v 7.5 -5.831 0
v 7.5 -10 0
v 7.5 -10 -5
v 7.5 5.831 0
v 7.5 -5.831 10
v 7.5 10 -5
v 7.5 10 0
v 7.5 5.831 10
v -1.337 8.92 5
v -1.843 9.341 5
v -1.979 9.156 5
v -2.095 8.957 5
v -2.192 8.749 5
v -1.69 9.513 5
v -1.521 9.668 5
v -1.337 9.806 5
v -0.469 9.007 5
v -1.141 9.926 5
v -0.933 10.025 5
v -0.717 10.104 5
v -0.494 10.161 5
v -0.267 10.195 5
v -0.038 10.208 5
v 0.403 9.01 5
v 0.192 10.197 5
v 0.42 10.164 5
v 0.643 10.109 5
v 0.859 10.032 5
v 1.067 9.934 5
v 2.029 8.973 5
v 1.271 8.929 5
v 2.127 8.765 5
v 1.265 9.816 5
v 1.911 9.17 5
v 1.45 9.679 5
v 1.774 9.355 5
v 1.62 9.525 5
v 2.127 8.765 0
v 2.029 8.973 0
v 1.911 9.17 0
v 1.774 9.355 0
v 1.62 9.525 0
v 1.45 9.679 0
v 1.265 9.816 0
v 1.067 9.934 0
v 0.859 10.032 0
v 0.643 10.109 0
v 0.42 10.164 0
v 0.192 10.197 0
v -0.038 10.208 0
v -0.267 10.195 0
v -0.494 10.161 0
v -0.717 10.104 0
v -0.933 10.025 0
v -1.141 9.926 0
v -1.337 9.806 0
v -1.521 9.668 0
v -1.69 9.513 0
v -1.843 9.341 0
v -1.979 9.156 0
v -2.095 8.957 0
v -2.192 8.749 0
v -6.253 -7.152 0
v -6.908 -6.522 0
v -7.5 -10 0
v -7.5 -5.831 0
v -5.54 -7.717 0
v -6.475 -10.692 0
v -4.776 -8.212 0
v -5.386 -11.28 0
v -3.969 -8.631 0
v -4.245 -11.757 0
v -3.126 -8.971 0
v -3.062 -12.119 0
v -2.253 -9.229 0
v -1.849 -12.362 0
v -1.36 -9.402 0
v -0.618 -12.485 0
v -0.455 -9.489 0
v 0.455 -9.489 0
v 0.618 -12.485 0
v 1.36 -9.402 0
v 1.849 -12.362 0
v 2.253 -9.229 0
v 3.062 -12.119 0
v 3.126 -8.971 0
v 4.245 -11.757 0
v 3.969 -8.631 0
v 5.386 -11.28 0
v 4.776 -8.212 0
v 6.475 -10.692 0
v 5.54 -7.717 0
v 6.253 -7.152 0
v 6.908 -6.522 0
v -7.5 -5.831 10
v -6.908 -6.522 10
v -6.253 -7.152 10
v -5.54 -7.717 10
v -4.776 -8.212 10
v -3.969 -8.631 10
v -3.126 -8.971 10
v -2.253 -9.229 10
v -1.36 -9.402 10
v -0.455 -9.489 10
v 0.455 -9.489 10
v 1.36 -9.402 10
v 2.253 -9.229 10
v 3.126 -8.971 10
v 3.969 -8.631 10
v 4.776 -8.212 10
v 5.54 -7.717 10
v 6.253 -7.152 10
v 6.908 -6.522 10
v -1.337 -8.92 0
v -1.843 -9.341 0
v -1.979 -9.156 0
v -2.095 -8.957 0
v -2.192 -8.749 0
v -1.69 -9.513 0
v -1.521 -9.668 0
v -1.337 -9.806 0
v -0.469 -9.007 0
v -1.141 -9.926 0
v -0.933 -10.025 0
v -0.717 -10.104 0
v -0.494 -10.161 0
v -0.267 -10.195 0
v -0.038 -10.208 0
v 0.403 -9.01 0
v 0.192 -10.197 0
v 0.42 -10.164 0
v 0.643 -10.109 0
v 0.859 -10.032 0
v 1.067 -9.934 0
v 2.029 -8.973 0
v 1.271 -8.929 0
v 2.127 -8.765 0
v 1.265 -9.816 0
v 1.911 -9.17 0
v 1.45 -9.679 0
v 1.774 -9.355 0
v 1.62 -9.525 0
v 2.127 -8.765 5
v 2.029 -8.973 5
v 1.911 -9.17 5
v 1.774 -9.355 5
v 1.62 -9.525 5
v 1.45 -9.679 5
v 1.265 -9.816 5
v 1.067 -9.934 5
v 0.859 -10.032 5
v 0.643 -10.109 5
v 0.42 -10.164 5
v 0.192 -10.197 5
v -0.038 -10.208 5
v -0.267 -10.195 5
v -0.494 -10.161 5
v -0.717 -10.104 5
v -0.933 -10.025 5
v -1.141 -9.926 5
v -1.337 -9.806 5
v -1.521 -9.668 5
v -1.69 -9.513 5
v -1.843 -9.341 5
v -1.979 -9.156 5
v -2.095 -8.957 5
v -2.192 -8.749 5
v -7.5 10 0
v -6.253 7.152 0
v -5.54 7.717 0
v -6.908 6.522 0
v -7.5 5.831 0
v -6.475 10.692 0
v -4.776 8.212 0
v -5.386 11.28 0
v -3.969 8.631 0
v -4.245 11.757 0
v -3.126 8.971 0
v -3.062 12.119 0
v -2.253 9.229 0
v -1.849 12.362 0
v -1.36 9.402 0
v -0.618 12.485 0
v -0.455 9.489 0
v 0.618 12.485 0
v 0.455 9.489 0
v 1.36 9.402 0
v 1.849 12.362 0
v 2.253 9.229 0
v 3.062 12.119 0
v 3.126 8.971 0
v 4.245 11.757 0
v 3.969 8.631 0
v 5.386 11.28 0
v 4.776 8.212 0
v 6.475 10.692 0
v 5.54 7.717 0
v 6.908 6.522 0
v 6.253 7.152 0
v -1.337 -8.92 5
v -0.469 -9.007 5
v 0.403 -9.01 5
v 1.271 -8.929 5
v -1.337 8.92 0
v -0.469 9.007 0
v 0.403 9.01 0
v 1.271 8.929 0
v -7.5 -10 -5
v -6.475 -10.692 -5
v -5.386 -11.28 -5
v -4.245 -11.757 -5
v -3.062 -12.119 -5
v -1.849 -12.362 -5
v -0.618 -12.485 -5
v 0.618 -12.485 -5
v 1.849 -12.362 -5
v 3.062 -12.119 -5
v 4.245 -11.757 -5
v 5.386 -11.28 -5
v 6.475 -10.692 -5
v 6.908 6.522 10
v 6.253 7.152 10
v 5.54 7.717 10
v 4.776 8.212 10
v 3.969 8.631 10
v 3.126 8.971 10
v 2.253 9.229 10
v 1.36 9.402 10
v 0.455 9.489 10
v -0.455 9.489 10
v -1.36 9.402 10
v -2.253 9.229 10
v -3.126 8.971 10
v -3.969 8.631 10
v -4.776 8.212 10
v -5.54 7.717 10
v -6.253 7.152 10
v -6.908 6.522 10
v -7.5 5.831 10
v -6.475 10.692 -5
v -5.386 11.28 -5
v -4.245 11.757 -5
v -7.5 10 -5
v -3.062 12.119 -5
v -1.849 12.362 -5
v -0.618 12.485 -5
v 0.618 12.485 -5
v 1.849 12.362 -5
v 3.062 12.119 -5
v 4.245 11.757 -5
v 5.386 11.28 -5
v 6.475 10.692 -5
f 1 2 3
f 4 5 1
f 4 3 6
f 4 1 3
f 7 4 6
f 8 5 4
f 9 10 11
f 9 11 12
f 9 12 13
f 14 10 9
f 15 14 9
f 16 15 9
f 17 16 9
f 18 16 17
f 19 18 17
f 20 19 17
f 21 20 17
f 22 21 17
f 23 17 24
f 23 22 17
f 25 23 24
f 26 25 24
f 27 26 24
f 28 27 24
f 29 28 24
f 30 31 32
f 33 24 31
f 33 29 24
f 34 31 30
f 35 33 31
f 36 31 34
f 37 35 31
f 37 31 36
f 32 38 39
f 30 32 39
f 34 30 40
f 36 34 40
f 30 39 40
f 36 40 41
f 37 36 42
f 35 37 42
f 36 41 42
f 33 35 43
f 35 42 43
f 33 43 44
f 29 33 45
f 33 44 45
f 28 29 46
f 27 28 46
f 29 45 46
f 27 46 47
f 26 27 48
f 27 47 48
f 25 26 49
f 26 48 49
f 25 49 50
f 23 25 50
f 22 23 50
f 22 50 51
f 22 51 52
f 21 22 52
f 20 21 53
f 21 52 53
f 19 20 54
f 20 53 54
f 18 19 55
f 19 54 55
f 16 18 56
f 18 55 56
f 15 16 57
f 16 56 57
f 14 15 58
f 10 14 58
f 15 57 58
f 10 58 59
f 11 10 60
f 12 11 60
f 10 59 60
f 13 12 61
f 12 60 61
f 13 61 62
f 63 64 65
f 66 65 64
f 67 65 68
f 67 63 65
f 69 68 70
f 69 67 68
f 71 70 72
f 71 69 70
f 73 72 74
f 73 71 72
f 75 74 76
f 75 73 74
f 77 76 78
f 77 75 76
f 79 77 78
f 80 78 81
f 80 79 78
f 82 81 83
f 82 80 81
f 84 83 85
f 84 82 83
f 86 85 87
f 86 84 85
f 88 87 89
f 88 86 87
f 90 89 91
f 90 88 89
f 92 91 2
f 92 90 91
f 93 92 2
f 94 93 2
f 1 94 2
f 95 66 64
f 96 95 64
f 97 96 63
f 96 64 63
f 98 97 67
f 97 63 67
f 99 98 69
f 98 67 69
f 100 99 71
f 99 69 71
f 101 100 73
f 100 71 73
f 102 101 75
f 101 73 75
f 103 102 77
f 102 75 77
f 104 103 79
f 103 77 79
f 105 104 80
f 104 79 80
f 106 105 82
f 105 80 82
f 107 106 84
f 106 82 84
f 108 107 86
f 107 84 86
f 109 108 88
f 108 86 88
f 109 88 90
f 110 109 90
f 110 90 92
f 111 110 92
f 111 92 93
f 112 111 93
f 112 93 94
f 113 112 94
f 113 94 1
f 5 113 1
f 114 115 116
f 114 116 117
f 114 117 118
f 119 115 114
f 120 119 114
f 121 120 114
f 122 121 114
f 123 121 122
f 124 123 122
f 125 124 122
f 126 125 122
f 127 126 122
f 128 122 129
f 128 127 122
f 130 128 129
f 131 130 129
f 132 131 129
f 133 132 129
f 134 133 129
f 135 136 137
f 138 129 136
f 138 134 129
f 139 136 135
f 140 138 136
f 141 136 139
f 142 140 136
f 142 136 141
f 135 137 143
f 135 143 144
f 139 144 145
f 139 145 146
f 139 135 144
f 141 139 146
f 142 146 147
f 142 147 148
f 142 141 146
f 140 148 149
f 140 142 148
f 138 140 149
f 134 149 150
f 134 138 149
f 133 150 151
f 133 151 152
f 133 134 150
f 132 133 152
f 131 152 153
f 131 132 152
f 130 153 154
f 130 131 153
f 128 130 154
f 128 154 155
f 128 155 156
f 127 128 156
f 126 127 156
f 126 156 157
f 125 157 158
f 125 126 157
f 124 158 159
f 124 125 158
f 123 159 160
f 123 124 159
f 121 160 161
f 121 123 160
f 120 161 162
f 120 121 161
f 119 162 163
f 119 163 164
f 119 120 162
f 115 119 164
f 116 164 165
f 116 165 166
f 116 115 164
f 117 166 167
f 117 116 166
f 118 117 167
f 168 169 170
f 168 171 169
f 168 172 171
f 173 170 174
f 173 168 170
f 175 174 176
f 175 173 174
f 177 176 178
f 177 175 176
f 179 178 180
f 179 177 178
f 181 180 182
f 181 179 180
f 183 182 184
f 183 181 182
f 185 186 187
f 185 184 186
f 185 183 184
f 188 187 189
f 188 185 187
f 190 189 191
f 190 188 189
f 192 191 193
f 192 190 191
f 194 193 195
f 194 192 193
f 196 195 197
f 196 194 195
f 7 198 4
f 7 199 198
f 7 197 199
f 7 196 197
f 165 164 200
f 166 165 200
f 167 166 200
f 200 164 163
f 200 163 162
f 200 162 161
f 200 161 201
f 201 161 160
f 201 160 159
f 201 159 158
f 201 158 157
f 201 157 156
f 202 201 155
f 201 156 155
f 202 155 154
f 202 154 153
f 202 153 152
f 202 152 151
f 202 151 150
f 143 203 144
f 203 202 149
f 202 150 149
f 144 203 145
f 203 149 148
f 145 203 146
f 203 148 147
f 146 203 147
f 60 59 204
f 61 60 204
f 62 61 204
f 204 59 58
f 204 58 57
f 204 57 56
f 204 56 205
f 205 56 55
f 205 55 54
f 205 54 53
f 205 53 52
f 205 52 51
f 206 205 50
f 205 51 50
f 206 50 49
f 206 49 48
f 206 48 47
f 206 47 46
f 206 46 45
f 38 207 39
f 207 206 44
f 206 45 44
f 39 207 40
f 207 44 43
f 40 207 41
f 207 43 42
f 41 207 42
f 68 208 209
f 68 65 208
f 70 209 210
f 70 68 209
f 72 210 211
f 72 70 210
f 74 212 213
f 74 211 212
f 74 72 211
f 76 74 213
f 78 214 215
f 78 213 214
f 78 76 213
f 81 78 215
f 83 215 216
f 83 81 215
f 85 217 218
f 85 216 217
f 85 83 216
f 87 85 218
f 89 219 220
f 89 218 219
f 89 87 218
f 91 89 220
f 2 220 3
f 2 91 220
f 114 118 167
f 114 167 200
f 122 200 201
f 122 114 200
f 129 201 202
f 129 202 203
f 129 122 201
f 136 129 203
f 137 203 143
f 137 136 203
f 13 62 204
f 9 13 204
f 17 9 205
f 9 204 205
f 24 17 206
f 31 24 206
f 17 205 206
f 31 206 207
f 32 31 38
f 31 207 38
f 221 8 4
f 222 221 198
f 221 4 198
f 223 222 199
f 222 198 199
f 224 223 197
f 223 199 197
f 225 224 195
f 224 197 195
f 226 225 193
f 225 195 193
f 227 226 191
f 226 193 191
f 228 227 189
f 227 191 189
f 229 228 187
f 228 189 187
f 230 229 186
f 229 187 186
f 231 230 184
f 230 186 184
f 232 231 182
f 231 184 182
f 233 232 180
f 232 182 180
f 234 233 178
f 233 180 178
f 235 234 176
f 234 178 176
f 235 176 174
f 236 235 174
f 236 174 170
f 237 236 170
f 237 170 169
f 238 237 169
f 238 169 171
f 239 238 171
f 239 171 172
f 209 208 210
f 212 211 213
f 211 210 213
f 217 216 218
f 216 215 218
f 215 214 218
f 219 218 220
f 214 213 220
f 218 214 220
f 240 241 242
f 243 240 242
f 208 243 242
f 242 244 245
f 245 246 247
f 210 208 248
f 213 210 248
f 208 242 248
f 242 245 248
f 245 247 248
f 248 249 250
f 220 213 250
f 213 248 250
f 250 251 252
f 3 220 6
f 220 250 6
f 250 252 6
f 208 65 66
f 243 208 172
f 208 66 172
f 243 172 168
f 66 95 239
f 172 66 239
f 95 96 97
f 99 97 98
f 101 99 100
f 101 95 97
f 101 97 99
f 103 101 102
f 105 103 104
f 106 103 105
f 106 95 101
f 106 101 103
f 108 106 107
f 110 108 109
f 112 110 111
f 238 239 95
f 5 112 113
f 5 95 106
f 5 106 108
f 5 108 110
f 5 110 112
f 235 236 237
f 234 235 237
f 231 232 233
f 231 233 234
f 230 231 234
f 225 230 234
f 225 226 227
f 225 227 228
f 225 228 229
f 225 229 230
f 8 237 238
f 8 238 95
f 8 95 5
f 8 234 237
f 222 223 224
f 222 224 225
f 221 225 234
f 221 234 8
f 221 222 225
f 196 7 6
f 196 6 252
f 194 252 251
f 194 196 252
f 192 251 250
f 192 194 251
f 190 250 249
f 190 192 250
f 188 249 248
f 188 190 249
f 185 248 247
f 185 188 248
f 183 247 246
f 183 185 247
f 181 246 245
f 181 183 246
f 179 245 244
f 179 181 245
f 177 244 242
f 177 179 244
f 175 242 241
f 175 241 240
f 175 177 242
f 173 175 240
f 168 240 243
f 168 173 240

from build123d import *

# Parameters (mm, degrees)
F0_R      = 12.5
F1_DEPTH  = 5
F2_R      = 9.5
F3_DEPTH  = 10
F5_DEPTH  = 5
F7_W      = 30
F7_H      = 30
F7_W_2    = 15
F7_H_2    = 27
F8_DEPTH  = 10
F11_W     = 23.265004158
F11_H     = 35.2036263794
F12_DEPTH = 35


# Not quite as in the source:
# - a feature names something its author has since deleted; it is built from what else it names


with BuildPart() as f1:
    # F0 (on Top) → F1 (new body)
    with BuildSketch(Plane.XY):
        Circle(F0_R)
    extrude(amount=-F1_DEPTH)

    # F2 (on Top) → F3 (join)
    with BuildSketch(Plane.XY):
        Circle(F2_R)
    extrude(amount=F3_DEPTH)


with BuildPart() as f5:
    # F4 (on Top) → F5 (new body)
    with BuildSketch(Plane.XY):
        with BuildLine():
            ThreePointArc((-2.19192449, 8.7487287819), (-0.0332522533, 9.0190732649), (2.1273547272, 8.7646534521))
            ThreePointArc((2.1273547272, 8.7646534521), (-0.0376344683, 10.2076699565), (-2.19192449, 8.7487287819))
        make_face()
    extrude(amount=F5_DEPTH)


with BuildPart() as f6_1:
    # F6: instance of F5
    add(f5.part.mirror(Plane.XZ))


with BuildPart() as f8:
    # F7 (on Top) → F8 (new body, symmetric)
    with BuildSketch(Plane.XY):
        Rectangle(F7_W, F7_H)
        Rectangle(F7_W_2, F7_H_2, mode=Mode.SUBTRACT)
    extrude(amount=F8_DEPTH, both=True)


with BuildPart() as f1_1:
    add(f1.part)

    # F9: cut F8
    add(f8.part, mode=Mode.SUBTRACT)


with BuildPart() as f12:
    # F11 (on face) → F12 (new body)
    with BuildSketch(Plane(origin=(0, 0, -5), x_dir=(1, 0, 0), z_dir=(0, 0, -1))):
        with Locations((0.5739731714, -1.2244740501)):
            Rectangle(F11_W, F11_H)
        with BuildLine():
            Line((-7, 10.3561575886), (-7, 13.5))
            Line((-7, 13.5), (7, 13.5))
            Line((7, 13.5), (7, 10.3561575886))
            ThreePointArc((7, 10.3561575886), (7.2521867086, 10.1811486554), (7.5, 10))
            Line((7.5, 10), (7.5, -10))
            ThreePointArc((7.5, -10), (7.2521867086, -10.1811486554), (7, -10.3561575886))
            Line((7, -10.3561575886), (7, -13.5))
            Line((7, -13.5), (-7, -13.5))
            Line((-7, -13.5), (-7, -10.3561575886))
            ThreePointArc((-7, -10.3561575886), (-7.2521867086, -10.1811486554), (-7.5, -10))
            Line((-7.5, -10), (-7.5, 10))
            ThreePointArc((-7.5, 10), (-7.2521867086, 10.1811486554), (-7, 10.3561575886))
        make_face(mode=Mode.SUBTRACT)
    extrude(amount=-F12_DEPTH)


with BuildPart() as f6_1_1:
    add(f6_1.part)

    # F13: cut F12
    add(f12.part, mode=Mode.SUBTRACT)


with BuildPart() as f5_1:
    add(f5.part)

    # F13: cut F12
    add(f12.part, mode=Mode.SUBTRACT)


with BuildPart() as f1_2:
    add(f1_1.part)

    # F13: cut F12
    add(f12.part, mode=Mode.SUBTRACT)


solid = Compound([f6_1_1.part, f5_1.part, f1_2.part])
